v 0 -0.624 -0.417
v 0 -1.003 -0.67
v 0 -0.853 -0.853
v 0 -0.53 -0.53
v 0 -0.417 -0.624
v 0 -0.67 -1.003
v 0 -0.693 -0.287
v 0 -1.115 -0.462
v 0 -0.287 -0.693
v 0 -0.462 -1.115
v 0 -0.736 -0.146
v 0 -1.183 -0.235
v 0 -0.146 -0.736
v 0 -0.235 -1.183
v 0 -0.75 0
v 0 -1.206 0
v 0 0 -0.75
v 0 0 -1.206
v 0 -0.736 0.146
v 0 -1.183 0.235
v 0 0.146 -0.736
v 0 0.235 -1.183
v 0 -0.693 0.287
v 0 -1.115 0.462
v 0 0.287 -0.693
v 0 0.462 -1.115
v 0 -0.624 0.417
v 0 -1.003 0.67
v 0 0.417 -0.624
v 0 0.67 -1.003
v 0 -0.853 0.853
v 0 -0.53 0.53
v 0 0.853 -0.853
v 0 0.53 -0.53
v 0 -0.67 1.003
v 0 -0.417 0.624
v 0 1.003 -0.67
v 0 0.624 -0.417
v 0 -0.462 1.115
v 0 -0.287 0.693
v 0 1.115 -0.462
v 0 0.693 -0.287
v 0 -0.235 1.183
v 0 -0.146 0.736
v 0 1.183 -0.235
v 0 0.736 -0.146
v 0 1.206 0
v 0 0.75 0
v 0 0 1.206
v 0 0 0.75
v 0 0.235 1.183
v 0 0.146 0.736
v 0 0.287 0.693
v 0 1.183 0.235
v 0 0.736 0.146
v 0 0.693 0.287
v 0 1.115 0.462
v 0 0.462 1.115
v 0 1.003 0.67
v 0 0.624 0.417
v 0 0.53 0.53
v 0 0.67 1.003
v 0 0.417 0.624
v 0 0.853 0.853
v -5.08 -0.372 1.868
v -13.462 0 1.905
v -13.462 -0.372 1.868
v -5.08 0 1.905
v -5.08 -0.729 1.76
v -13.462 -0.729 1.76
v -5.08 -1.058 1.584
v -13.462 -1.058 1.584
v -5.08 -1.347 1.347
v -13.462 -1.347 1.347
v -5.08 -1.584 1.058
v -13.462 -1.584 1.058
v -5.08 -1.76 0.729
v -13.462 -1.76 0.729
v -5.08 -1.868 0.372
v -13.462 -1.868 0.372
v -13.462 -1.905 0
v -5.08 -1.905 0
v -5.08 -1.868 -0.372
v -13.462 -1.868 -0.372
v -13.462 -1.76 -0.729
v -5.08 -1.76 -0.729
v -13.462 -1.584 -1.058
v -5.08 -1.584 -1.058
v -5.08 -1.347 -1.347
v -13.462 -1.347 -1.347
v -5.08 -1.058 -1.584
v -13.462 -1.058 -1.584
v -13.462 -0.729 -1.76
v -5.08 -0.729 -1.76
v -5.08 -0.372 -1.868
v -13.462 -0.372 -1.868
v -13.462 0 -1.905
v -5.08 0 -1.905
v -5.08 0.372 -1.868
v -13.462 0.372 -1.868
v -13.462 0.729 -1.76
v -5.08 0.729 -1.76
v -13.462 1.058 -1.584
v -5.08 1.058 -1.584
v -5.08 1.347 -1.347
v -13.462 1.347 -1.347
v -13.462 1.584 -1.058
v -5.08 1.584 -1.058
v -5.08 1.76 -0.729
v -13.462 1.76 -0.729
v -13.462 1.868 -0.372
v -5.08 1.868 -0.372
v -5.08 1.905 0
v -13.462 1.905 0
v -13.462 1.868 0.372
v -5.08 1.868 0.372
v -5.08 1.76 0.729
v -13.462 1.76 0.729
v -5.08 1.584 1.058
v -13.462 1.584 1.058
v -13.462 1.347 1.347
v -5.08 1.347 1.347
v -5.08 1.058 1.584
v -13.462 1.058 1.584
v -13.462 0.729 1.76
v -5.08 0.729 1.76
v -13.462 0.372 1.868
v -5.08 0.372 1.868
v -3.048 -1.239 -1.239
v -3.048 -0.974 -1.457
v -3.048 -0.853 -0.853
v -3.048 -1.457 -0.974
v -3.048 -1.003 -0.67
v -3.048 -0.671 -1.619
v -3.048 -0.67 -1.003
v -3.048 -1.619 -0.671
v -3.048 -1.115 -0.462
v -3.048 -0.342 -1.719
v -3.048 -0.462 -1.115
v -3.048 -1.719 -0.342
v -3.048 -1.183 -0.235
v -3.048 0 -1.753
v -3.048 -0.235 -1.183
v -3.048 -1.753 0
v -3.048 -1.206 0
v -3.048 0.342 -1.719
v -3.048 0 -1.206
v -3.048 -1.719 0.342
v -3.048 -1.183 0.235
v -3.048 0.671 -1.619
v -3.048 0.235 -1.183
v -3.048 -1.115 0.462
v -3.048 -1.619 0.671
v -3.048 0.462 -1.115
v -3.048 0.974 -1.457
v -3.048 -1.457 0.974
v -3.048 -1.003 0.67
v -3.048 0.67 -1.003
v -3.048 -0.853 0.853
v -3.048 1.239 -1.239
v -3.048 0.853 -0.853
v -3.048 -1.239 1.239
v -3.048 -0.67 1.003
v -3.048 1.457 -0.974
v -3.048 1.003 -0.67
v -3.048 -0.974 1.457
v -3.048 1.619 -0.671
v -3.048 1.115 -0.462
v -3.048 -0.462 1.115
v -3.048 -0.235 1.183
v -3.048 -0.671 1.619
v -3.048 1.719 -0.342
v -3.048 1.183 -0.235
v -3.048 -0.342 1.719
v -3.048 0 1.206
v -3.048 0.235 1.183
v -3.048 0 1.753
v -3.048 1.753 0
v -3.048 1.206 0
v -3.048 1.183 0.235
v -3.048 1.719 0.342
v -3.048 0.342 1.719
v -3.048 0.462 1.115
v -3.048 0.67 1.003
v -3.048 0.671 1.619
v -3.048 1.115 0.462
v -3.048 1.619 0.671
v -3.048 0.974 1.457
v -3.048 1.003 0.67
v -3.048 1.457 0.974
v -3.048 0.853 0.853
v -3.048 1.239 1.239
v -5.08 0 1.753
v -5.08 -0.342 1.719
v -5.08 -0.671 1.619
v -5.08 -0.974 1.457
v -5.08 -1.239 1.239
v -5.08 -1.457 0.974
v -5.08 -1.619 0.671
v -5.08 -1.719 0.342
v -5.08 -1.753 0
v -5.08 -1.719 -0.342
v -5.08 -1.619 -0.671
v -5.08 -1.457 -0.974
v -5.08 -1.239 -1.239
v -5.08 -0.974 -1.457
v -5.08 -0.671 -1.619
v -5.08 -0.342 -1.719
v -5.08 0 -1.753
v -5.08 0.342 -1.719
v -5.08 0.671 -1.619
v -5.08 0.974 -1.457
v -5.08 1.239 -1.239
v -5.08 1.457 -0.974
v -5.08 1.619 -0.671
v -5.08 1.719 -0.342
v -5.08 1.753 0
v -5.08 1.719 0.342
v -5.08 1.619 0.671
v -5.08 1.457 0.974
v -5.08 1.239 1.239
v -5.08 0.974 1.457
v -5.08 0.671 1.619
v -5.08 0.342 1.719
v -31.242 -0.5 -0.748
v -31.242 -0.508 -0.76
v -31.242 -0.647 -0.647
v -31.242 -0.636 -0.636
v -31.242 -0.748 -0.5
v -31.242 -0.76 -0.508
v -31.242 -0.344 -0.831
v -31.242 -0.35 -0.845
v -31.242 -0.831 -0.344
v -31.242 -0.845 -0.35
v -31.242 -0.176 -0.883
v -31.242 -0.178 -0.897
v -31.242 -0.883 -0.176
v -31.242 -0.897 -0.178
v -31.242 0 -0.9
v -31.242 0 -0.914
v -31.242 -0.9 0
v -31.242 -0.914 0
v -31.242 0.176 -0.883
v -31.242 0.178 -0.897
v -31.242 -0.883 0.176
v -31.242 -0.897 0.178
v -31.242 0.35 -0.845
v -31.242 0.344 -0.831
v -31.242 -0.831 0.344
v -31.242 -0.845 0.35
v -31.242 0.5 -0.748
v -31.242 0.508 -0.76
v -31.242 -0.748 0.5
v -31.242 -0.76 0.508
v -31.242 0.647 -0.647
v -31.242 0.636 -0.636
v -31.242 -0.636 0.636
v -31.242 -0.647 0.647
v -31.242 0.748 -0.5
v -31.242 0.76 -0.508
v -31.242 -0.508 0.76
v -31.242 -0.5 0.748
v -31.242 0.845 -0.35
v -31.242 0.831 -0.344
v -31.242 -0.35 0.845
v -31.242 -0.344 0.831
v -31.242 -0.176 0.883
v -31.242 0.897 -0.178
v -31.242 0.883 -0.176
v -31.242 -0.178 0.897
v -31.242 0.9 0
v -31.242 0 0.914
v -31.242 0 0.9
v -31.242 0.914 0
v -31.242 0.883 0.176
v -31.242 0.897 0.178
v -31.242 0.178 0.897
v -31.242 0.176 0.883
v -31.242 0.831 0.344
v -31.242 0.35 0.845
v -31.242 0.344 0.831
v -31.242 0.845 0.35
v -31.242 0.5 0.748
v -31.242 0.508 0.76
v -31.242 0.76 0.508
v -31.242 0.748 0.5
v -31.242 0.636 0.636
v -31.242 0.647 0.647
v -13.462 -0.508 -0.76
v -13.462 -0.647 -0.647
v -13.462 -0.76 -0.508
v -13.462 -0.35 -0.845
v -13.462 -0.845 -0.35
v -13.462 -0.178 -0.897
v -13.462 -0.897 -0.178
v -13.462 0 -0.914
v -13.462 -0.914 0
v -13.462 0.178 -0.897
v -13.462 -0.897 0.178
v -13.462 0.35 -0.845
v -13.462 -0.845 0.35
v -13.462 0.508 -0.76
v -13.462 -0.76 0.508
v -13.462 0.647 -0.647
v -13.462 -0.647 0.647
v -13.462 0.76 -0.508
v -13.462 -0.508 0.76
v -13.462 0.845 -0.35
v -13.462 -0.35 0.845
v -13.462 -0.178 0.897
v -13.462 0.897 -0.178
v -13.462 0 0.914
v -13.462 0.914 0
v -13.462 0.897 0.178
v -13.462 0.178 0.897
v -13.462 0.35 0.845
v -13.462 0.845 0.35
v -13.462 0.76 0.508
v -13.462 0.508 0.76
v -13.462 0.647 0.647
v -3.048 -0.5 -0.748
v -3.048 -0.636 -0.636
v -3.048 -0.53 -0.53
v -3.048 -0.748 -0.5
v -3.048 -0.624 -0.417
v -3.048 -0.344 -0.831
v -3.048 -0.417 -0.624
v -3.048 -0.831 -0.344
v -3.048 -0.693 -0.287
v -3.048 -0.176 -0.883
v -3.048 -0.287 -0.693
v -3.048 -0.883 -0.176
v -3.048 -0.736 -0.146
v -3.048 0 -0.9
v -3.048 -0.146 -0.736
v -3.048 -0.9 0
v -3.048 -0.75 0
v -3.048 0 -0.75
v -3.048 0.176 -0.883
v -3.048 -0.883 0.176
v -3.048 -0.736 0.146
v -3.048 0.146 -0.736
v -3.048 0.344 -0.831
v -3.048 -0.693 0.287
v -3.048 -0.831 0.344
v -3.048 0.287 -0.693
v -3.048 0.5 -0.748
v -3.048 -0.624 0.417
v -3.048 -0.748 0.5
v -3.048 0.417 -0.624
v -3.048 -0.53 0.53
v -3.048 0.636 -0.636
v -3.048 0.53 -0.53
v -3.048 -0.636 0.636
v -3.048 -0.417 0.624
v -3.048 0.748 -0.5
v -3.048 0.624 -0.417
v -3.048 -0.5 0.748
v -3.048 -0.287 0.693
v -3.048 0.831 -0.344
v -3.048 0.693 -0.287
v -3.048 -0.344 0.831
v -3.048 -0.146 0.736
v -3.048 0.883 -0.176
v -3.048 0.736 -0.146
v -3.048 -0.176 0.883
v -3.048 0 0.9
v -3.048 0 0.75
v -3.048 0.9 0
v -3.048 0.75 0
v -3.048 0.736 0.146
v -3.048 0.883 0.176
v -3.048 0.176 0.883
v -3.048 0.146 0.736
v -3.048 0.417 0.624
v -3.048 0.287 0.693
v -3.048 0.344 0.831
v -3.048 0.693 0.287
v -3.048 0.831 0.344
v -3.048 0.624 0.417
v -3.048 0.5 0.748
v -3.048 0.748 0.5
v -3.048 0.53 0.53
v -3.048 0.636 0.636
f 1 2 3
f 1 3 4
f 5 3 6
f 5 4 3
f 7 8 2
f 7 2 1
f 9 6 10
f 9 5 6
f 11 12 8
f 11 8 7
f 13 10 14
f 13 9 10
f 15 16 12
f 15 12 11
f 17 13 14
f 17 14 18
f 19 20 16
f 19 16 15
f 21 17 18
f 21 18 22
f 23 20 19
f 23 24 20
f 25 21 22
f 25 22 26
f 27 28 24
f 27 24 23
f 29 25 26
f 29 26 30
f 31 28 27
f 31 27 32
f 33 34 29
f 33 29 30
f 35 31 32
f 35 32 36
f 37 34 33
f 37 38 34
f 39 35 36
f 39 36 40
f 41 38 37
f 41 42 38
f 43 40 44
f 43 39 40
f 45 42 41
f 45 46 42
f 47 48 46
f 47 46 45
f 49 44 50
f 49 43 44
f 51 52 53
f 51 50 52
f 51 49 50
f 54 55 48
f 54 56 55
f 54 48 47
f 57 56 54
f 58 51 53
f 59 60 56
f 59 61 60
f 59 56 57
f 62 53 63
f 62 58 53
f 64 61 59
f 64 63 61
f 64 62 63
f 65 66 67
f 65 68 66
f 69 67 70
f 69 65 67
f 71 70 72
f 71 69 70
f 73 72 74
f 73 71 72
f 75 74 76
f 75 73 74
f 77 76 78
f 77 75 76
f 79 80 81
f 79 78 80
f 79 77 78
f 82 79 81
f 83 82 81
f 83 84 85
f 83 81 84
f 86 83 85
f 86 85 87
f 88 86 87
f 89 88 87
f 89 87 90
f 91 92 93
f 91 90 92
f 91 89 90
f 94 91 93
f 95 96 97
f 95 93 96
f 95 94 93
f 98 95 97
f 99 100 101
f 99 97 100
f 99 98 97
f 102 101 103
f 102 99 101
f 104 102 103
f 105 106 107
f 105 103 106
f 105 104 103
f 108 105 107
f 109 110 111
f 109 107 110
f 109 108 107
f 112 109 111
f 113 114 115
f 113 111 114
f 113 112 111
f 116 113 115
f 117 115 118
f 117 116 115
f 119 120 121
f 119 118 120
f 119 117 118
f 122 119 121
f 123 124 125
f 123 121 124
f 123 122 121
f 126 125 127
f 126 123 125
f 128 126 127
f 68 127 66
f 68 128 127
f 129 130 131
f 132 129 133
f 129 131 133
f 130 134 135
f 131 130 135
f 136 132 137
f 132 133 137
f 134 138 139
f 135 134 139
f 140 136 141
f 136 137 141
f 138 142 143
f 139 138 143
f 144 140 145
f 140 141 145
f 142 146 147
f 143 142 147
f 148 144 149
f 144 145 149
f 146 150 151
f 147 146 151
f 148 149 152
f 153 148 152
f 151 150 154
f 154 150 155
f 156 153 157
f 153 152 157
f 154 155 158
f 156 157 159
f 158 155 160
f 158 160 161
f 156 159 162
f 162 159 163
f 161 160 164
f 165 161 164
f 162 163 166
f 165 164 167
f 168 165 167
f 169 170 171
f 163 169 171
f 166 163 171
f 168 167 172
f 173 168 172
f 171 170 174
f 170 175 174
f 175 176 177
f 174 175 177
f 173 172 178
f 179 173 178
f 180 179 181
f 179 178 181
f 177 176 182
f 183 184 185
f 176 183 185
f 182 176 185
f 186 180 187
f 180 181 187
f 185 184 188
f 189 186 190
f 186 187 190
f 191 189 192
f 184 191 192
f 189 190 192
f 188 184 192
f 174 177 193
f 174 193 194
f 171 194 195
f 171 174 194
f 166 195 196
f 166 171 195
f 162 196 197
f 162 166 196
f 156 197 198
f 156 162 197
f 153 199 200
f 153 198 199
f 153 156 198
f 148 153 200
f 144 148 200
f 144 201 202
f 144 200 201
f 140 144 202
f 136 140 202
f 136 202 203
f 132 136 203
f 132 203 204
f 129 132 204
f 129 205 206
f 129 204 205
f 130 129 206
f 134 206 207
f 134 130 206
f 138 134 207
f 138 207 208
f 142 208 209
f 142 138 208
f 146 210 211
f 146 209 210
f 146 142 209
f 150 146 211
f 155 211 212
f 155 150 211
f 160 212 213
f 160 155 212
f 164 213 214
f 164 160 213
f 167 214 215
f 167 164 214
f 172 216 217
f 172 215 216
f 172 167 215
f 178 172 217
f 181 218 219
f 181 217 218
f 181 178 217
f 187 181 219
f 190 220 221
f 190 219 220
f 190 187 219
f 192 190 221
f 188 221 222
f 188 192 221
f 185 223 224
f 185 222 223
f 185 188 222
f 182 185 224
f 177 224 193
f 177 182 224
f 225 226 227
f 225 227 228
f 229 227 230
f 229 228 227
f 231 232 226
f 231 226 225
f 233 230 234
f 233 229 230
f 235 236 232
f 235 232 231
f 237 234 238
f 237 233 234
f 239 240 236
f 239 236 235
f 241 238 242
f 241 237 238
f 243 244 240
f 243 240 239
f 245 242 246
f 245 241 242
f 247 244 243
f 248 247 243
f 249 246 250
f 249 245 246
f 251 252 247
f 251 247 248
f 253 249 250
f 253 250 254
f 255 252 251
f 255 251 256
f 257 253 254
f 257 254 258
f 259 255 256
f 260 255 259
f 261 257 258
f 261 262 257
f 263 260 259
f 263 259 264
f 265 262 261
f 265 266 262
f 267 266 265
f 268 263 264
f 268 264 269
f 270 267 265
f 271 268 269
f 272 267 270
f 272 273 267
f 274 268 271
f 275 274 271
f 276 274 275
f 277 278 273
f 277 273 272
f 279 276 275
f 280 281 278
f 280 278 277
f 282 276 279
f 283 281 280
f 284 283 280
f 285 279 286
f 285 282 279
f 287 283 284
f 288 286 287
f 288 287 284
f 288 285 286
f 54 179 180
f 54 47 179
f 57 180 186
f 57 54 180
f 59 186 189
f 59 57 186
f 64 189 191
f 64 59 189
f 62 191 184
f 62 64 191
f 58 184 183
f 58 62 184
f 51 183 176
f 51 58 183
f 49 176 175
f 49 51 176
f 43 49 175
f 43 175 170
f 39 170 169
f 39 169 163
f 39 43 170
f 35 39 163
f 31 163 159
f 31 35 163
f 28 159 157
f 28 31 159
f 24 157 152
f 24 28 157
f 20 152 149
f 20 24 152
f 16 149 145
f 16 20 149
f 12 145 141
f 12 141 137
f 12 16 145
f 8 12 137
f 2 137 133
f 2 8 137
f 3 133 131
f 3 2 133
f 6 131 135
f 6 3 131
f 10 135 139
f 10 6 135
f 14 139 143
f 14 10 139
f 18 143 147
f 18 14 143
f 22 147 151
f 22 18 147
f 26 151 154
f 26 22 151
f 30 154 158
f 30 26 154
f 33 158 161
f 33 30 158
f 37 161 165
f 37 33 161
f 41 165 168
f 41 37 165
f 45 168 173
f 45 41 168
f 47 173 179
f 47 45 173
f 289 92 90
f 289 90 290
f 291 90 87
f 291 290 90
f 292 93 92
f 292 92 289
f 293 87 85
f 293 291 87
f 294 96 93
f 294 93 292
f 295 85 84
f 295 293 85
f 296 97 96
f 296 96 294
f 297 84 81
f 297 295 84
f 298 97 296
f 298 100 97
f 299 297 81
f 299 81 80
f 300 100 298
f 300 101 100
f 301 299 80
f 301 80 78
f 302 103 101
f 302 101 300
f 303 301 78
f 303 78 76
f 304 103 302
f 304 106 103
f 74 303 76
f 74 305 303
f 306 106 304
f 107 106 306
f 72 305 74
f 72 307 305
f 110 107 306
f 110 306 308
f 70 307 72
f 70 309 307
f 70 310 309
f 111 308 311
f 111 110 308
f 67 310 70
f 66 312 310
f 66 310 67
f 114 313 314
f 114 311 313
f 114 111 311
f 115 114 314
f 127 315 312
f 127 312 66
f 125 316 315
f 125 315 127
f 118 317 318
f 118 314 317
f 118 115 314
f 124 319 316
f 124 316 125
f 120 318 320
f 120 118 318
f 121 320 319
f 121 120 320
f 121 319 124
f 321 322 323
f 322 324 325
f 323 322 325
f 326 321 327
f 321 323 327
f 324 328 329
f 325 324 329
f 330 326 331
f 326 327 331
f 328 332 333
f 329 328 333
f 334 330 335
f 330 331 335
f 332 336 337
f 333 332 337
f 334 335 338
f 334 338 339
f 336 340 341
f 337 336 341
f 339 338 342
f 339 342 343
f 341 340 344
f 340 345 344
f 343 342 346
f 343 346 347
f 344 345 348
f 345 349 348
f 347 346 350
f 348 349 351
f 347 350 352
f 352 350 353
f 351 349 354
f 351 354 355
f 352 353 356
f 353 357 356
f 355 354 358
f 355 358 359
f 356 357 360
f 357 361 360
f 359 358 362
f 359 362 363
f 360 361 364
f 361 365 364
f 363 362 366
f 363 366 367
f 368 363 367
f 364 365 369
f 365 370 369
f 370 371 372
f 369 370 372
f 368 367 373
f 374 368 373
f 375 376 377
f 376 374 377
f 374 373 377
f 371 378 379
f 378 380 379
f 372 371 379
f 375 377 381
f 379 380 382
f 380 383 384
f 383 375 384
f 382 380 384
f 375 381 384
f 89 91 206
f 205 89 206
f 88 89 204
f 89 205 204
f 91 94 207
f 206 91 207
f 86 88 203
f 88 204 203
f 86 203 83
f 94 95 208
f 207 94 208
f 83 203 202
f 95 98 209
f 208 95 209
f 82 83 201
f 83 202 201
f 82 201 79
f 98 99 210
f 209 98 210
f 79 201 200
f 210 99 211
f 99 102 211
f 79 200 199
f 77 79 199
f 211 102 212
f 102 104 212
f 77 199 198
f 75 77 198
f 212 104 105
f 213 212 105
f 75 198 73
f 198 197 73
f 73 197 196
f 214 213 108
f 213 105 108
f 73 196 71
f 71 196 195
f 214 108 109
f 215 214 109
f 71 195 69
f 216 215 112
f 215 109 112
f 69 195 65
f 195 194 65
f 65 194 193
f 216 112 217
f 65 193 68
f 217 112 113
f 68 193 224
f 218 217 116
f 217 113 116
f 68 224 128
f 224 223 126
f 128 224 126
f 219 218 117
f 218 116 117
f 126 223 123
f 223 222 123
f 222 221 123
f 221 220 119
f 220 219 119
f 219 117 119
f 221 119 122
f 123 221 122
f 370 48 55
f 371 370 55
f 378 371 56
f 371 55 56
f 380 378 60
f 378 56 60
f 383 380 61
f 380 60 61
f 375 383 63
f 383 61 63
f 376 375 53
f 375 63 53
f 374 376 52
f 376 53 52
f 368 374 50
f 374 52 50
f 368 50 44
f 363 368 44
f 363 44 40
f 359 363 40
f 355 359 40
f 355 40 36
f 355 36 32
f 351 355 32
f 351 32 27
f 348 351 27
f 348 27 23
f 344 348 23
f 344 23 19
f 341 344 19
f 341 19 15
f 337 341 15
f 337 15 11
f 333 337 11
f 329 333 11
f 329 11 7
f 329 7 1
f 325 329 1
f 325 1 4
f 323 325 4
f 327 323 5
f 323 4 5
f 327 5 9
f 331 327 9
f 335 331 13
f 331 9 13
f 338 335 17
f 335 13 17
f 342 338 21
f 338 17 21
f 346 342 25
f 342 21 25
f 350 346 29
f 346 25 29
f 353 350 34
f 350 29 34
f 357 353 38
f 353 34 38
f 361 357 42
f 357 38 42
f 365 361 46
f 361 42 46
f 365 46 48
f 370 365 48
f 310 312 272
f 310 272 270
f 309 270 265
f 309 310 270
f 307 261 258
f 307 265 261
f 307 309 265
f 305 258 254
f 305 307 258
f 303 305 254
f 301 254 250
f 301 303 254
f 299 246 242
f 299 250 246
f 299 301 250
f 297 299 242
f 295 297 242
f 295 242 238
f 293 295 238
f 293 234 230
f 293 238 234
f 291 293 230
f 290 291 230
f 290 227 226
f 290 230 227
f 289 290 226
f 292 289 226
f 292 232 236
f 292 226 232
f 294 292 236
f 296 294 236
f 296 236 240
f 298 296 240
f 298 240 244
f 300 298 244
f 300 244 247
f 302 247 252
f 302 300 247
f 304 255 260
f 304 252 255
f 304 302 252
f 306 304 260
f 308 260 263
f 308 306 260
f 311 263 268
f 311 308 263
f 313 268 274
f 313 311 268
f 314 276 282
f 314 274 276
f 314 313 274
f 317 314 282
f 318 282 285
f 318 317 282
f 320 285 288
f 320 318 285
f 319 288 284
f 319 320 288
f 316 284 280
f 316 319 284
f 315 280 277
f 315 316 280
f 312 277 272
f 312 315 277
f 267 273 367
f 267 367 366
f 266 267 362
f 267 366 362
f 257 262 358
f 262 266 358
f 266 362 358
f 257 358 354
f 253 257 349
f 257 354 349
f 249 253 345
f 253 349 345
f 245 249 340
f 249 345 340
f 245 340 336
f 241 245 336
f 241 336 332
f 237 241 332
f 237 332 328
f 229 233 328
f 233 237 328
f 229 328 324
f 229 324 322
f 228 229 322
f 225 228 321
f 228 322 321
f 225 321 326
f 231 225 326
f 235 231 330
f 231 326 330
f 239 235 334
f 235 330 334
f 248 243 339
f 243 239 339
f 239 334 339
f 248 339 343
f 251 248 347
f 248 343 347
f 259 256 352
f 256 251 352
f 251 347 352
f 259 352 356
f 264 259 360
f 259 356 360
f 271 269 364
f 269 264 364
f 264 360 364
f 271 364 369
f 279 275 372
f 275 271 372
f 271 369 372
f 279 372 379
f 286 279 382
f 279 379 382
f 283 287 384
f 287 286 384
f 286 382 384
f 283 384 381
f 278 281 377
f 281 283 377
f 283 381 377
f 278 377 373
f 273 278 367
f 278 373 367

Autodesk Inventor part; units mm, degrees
ref_plane "XZ Plane" through (0, 0, 0) normal (0, 1, 0) x (-1, 0, 0)
sketch "Sketch2" plane through (0, 0, 0) normal (0, 1, 0) x (-1, 0, 0)
  line L0 (0, 0) -> (-5, 0)
  line L1 (-5, 0) -> (-10, 1.6)
  line L2 (-10, 1.6) -> (-15, 1.6)
  dimension "d0" = 1.6
  dimension "d1" = 5
  dimension "d2" = 5
  dimension "d3" = 5
sketch "Sketch3" plane through (0, 0, 0) normal (1, 0, 0) x (0, 1, 0)
  circle A0 centre (0, 0) radius 0.9
  dimension "d4" = 1.8
sweep "Sweep1" [suppressed]
ref_plane "Work Plane1" through (0, 0, 1.6) normal (0, 0, 1) x (1, 0, 0)
sketch "Sketch4" plane through (0, 0, 1.6) normal (0, 0, 1) x (1, 0, 0)
  line L0 (25, -15) -> (25, -66.3933)
  line L1 (0, 0) -> (10, 0)
  arc A0 (25, -15) -> (10, 0) centre (10, -15) ccw
  dimension "d33" = 15
  dimension "d34" = 25
  dimension "d35" = 51.3933
ref_plane "Work Plane2" through (15, 0, 0) normal (1, 0, 0) x (0, 1, 0)
sketch "Sketch5" plane through (15, 0, 0) normal (1, 0, 0) x (0, 1, 0)
  circle A0 centre (0, 1.6) radius 0.9
  point P0 (0, 0)
  dimension "d16" = 1.6
  dimension "d17" = 1.8
sweep "Sweep2" [suppressed]
sketch "Sketch7" plane through (0, 0, 0) normal (1, 0, 0) x (0, 1, 0)
  circle A0 centre (0, 0) radius 0.75
  circle A1 centre (0, 0) radius 1.2065
  dimension "d21" = 2.413
  dimension "d36" = 1.5
extrude "Extrusion1" add sketch "Sketch7" against normal blind 3.048
sketch "Sketch8" plane through (-3.048, 0, 0) normal (-1, 0, 0) x (0, 0, 1)
  circle A0 centre (0, 0) radius 0.9 projected
  circle A1 centre (0, 0) radius 1.2065 projected
  circle A2 centre (0, 0) radius 1.7526
  dimension "d24" = 3.5052
extrude "Extrusion2" add sketch "Sketch8" along normal blind 2.032 contours A1 | A2
sketch "Sketch9" plane through (-5.08, 0, 0) normal (-1, 0, 0) x (0, 0, 1)
  circle A0 centre (0, 0) radius 0.9 projected
  circle A1 centre (0, 0) radius 1.7526 projected
  circle A2 centre (0, 0) radius 1.905
  dimension "d27" = 3.81
extrude "Extrusion3" add sketch "Sketch9" along normal blind 8.382 contours A1 | A2
sketch "Sketch10" plane through (-13.462, 0, 0) normal (-1, 0, 0) x (0, 0, 1)
  circle A0 centre (0, 0) radius 0.9 projected
  circle A1 centre (0, 0) radius 1.905 projected
  circle A2 centre (0, 0) radius 0.9144
  dimension "d30" = 1.8288
extrude "Extr_RG-178_72mils" add sketch "Sketch10" along normal blind 17.78 contours A2
properties part number "mmcx_coax_tip"
